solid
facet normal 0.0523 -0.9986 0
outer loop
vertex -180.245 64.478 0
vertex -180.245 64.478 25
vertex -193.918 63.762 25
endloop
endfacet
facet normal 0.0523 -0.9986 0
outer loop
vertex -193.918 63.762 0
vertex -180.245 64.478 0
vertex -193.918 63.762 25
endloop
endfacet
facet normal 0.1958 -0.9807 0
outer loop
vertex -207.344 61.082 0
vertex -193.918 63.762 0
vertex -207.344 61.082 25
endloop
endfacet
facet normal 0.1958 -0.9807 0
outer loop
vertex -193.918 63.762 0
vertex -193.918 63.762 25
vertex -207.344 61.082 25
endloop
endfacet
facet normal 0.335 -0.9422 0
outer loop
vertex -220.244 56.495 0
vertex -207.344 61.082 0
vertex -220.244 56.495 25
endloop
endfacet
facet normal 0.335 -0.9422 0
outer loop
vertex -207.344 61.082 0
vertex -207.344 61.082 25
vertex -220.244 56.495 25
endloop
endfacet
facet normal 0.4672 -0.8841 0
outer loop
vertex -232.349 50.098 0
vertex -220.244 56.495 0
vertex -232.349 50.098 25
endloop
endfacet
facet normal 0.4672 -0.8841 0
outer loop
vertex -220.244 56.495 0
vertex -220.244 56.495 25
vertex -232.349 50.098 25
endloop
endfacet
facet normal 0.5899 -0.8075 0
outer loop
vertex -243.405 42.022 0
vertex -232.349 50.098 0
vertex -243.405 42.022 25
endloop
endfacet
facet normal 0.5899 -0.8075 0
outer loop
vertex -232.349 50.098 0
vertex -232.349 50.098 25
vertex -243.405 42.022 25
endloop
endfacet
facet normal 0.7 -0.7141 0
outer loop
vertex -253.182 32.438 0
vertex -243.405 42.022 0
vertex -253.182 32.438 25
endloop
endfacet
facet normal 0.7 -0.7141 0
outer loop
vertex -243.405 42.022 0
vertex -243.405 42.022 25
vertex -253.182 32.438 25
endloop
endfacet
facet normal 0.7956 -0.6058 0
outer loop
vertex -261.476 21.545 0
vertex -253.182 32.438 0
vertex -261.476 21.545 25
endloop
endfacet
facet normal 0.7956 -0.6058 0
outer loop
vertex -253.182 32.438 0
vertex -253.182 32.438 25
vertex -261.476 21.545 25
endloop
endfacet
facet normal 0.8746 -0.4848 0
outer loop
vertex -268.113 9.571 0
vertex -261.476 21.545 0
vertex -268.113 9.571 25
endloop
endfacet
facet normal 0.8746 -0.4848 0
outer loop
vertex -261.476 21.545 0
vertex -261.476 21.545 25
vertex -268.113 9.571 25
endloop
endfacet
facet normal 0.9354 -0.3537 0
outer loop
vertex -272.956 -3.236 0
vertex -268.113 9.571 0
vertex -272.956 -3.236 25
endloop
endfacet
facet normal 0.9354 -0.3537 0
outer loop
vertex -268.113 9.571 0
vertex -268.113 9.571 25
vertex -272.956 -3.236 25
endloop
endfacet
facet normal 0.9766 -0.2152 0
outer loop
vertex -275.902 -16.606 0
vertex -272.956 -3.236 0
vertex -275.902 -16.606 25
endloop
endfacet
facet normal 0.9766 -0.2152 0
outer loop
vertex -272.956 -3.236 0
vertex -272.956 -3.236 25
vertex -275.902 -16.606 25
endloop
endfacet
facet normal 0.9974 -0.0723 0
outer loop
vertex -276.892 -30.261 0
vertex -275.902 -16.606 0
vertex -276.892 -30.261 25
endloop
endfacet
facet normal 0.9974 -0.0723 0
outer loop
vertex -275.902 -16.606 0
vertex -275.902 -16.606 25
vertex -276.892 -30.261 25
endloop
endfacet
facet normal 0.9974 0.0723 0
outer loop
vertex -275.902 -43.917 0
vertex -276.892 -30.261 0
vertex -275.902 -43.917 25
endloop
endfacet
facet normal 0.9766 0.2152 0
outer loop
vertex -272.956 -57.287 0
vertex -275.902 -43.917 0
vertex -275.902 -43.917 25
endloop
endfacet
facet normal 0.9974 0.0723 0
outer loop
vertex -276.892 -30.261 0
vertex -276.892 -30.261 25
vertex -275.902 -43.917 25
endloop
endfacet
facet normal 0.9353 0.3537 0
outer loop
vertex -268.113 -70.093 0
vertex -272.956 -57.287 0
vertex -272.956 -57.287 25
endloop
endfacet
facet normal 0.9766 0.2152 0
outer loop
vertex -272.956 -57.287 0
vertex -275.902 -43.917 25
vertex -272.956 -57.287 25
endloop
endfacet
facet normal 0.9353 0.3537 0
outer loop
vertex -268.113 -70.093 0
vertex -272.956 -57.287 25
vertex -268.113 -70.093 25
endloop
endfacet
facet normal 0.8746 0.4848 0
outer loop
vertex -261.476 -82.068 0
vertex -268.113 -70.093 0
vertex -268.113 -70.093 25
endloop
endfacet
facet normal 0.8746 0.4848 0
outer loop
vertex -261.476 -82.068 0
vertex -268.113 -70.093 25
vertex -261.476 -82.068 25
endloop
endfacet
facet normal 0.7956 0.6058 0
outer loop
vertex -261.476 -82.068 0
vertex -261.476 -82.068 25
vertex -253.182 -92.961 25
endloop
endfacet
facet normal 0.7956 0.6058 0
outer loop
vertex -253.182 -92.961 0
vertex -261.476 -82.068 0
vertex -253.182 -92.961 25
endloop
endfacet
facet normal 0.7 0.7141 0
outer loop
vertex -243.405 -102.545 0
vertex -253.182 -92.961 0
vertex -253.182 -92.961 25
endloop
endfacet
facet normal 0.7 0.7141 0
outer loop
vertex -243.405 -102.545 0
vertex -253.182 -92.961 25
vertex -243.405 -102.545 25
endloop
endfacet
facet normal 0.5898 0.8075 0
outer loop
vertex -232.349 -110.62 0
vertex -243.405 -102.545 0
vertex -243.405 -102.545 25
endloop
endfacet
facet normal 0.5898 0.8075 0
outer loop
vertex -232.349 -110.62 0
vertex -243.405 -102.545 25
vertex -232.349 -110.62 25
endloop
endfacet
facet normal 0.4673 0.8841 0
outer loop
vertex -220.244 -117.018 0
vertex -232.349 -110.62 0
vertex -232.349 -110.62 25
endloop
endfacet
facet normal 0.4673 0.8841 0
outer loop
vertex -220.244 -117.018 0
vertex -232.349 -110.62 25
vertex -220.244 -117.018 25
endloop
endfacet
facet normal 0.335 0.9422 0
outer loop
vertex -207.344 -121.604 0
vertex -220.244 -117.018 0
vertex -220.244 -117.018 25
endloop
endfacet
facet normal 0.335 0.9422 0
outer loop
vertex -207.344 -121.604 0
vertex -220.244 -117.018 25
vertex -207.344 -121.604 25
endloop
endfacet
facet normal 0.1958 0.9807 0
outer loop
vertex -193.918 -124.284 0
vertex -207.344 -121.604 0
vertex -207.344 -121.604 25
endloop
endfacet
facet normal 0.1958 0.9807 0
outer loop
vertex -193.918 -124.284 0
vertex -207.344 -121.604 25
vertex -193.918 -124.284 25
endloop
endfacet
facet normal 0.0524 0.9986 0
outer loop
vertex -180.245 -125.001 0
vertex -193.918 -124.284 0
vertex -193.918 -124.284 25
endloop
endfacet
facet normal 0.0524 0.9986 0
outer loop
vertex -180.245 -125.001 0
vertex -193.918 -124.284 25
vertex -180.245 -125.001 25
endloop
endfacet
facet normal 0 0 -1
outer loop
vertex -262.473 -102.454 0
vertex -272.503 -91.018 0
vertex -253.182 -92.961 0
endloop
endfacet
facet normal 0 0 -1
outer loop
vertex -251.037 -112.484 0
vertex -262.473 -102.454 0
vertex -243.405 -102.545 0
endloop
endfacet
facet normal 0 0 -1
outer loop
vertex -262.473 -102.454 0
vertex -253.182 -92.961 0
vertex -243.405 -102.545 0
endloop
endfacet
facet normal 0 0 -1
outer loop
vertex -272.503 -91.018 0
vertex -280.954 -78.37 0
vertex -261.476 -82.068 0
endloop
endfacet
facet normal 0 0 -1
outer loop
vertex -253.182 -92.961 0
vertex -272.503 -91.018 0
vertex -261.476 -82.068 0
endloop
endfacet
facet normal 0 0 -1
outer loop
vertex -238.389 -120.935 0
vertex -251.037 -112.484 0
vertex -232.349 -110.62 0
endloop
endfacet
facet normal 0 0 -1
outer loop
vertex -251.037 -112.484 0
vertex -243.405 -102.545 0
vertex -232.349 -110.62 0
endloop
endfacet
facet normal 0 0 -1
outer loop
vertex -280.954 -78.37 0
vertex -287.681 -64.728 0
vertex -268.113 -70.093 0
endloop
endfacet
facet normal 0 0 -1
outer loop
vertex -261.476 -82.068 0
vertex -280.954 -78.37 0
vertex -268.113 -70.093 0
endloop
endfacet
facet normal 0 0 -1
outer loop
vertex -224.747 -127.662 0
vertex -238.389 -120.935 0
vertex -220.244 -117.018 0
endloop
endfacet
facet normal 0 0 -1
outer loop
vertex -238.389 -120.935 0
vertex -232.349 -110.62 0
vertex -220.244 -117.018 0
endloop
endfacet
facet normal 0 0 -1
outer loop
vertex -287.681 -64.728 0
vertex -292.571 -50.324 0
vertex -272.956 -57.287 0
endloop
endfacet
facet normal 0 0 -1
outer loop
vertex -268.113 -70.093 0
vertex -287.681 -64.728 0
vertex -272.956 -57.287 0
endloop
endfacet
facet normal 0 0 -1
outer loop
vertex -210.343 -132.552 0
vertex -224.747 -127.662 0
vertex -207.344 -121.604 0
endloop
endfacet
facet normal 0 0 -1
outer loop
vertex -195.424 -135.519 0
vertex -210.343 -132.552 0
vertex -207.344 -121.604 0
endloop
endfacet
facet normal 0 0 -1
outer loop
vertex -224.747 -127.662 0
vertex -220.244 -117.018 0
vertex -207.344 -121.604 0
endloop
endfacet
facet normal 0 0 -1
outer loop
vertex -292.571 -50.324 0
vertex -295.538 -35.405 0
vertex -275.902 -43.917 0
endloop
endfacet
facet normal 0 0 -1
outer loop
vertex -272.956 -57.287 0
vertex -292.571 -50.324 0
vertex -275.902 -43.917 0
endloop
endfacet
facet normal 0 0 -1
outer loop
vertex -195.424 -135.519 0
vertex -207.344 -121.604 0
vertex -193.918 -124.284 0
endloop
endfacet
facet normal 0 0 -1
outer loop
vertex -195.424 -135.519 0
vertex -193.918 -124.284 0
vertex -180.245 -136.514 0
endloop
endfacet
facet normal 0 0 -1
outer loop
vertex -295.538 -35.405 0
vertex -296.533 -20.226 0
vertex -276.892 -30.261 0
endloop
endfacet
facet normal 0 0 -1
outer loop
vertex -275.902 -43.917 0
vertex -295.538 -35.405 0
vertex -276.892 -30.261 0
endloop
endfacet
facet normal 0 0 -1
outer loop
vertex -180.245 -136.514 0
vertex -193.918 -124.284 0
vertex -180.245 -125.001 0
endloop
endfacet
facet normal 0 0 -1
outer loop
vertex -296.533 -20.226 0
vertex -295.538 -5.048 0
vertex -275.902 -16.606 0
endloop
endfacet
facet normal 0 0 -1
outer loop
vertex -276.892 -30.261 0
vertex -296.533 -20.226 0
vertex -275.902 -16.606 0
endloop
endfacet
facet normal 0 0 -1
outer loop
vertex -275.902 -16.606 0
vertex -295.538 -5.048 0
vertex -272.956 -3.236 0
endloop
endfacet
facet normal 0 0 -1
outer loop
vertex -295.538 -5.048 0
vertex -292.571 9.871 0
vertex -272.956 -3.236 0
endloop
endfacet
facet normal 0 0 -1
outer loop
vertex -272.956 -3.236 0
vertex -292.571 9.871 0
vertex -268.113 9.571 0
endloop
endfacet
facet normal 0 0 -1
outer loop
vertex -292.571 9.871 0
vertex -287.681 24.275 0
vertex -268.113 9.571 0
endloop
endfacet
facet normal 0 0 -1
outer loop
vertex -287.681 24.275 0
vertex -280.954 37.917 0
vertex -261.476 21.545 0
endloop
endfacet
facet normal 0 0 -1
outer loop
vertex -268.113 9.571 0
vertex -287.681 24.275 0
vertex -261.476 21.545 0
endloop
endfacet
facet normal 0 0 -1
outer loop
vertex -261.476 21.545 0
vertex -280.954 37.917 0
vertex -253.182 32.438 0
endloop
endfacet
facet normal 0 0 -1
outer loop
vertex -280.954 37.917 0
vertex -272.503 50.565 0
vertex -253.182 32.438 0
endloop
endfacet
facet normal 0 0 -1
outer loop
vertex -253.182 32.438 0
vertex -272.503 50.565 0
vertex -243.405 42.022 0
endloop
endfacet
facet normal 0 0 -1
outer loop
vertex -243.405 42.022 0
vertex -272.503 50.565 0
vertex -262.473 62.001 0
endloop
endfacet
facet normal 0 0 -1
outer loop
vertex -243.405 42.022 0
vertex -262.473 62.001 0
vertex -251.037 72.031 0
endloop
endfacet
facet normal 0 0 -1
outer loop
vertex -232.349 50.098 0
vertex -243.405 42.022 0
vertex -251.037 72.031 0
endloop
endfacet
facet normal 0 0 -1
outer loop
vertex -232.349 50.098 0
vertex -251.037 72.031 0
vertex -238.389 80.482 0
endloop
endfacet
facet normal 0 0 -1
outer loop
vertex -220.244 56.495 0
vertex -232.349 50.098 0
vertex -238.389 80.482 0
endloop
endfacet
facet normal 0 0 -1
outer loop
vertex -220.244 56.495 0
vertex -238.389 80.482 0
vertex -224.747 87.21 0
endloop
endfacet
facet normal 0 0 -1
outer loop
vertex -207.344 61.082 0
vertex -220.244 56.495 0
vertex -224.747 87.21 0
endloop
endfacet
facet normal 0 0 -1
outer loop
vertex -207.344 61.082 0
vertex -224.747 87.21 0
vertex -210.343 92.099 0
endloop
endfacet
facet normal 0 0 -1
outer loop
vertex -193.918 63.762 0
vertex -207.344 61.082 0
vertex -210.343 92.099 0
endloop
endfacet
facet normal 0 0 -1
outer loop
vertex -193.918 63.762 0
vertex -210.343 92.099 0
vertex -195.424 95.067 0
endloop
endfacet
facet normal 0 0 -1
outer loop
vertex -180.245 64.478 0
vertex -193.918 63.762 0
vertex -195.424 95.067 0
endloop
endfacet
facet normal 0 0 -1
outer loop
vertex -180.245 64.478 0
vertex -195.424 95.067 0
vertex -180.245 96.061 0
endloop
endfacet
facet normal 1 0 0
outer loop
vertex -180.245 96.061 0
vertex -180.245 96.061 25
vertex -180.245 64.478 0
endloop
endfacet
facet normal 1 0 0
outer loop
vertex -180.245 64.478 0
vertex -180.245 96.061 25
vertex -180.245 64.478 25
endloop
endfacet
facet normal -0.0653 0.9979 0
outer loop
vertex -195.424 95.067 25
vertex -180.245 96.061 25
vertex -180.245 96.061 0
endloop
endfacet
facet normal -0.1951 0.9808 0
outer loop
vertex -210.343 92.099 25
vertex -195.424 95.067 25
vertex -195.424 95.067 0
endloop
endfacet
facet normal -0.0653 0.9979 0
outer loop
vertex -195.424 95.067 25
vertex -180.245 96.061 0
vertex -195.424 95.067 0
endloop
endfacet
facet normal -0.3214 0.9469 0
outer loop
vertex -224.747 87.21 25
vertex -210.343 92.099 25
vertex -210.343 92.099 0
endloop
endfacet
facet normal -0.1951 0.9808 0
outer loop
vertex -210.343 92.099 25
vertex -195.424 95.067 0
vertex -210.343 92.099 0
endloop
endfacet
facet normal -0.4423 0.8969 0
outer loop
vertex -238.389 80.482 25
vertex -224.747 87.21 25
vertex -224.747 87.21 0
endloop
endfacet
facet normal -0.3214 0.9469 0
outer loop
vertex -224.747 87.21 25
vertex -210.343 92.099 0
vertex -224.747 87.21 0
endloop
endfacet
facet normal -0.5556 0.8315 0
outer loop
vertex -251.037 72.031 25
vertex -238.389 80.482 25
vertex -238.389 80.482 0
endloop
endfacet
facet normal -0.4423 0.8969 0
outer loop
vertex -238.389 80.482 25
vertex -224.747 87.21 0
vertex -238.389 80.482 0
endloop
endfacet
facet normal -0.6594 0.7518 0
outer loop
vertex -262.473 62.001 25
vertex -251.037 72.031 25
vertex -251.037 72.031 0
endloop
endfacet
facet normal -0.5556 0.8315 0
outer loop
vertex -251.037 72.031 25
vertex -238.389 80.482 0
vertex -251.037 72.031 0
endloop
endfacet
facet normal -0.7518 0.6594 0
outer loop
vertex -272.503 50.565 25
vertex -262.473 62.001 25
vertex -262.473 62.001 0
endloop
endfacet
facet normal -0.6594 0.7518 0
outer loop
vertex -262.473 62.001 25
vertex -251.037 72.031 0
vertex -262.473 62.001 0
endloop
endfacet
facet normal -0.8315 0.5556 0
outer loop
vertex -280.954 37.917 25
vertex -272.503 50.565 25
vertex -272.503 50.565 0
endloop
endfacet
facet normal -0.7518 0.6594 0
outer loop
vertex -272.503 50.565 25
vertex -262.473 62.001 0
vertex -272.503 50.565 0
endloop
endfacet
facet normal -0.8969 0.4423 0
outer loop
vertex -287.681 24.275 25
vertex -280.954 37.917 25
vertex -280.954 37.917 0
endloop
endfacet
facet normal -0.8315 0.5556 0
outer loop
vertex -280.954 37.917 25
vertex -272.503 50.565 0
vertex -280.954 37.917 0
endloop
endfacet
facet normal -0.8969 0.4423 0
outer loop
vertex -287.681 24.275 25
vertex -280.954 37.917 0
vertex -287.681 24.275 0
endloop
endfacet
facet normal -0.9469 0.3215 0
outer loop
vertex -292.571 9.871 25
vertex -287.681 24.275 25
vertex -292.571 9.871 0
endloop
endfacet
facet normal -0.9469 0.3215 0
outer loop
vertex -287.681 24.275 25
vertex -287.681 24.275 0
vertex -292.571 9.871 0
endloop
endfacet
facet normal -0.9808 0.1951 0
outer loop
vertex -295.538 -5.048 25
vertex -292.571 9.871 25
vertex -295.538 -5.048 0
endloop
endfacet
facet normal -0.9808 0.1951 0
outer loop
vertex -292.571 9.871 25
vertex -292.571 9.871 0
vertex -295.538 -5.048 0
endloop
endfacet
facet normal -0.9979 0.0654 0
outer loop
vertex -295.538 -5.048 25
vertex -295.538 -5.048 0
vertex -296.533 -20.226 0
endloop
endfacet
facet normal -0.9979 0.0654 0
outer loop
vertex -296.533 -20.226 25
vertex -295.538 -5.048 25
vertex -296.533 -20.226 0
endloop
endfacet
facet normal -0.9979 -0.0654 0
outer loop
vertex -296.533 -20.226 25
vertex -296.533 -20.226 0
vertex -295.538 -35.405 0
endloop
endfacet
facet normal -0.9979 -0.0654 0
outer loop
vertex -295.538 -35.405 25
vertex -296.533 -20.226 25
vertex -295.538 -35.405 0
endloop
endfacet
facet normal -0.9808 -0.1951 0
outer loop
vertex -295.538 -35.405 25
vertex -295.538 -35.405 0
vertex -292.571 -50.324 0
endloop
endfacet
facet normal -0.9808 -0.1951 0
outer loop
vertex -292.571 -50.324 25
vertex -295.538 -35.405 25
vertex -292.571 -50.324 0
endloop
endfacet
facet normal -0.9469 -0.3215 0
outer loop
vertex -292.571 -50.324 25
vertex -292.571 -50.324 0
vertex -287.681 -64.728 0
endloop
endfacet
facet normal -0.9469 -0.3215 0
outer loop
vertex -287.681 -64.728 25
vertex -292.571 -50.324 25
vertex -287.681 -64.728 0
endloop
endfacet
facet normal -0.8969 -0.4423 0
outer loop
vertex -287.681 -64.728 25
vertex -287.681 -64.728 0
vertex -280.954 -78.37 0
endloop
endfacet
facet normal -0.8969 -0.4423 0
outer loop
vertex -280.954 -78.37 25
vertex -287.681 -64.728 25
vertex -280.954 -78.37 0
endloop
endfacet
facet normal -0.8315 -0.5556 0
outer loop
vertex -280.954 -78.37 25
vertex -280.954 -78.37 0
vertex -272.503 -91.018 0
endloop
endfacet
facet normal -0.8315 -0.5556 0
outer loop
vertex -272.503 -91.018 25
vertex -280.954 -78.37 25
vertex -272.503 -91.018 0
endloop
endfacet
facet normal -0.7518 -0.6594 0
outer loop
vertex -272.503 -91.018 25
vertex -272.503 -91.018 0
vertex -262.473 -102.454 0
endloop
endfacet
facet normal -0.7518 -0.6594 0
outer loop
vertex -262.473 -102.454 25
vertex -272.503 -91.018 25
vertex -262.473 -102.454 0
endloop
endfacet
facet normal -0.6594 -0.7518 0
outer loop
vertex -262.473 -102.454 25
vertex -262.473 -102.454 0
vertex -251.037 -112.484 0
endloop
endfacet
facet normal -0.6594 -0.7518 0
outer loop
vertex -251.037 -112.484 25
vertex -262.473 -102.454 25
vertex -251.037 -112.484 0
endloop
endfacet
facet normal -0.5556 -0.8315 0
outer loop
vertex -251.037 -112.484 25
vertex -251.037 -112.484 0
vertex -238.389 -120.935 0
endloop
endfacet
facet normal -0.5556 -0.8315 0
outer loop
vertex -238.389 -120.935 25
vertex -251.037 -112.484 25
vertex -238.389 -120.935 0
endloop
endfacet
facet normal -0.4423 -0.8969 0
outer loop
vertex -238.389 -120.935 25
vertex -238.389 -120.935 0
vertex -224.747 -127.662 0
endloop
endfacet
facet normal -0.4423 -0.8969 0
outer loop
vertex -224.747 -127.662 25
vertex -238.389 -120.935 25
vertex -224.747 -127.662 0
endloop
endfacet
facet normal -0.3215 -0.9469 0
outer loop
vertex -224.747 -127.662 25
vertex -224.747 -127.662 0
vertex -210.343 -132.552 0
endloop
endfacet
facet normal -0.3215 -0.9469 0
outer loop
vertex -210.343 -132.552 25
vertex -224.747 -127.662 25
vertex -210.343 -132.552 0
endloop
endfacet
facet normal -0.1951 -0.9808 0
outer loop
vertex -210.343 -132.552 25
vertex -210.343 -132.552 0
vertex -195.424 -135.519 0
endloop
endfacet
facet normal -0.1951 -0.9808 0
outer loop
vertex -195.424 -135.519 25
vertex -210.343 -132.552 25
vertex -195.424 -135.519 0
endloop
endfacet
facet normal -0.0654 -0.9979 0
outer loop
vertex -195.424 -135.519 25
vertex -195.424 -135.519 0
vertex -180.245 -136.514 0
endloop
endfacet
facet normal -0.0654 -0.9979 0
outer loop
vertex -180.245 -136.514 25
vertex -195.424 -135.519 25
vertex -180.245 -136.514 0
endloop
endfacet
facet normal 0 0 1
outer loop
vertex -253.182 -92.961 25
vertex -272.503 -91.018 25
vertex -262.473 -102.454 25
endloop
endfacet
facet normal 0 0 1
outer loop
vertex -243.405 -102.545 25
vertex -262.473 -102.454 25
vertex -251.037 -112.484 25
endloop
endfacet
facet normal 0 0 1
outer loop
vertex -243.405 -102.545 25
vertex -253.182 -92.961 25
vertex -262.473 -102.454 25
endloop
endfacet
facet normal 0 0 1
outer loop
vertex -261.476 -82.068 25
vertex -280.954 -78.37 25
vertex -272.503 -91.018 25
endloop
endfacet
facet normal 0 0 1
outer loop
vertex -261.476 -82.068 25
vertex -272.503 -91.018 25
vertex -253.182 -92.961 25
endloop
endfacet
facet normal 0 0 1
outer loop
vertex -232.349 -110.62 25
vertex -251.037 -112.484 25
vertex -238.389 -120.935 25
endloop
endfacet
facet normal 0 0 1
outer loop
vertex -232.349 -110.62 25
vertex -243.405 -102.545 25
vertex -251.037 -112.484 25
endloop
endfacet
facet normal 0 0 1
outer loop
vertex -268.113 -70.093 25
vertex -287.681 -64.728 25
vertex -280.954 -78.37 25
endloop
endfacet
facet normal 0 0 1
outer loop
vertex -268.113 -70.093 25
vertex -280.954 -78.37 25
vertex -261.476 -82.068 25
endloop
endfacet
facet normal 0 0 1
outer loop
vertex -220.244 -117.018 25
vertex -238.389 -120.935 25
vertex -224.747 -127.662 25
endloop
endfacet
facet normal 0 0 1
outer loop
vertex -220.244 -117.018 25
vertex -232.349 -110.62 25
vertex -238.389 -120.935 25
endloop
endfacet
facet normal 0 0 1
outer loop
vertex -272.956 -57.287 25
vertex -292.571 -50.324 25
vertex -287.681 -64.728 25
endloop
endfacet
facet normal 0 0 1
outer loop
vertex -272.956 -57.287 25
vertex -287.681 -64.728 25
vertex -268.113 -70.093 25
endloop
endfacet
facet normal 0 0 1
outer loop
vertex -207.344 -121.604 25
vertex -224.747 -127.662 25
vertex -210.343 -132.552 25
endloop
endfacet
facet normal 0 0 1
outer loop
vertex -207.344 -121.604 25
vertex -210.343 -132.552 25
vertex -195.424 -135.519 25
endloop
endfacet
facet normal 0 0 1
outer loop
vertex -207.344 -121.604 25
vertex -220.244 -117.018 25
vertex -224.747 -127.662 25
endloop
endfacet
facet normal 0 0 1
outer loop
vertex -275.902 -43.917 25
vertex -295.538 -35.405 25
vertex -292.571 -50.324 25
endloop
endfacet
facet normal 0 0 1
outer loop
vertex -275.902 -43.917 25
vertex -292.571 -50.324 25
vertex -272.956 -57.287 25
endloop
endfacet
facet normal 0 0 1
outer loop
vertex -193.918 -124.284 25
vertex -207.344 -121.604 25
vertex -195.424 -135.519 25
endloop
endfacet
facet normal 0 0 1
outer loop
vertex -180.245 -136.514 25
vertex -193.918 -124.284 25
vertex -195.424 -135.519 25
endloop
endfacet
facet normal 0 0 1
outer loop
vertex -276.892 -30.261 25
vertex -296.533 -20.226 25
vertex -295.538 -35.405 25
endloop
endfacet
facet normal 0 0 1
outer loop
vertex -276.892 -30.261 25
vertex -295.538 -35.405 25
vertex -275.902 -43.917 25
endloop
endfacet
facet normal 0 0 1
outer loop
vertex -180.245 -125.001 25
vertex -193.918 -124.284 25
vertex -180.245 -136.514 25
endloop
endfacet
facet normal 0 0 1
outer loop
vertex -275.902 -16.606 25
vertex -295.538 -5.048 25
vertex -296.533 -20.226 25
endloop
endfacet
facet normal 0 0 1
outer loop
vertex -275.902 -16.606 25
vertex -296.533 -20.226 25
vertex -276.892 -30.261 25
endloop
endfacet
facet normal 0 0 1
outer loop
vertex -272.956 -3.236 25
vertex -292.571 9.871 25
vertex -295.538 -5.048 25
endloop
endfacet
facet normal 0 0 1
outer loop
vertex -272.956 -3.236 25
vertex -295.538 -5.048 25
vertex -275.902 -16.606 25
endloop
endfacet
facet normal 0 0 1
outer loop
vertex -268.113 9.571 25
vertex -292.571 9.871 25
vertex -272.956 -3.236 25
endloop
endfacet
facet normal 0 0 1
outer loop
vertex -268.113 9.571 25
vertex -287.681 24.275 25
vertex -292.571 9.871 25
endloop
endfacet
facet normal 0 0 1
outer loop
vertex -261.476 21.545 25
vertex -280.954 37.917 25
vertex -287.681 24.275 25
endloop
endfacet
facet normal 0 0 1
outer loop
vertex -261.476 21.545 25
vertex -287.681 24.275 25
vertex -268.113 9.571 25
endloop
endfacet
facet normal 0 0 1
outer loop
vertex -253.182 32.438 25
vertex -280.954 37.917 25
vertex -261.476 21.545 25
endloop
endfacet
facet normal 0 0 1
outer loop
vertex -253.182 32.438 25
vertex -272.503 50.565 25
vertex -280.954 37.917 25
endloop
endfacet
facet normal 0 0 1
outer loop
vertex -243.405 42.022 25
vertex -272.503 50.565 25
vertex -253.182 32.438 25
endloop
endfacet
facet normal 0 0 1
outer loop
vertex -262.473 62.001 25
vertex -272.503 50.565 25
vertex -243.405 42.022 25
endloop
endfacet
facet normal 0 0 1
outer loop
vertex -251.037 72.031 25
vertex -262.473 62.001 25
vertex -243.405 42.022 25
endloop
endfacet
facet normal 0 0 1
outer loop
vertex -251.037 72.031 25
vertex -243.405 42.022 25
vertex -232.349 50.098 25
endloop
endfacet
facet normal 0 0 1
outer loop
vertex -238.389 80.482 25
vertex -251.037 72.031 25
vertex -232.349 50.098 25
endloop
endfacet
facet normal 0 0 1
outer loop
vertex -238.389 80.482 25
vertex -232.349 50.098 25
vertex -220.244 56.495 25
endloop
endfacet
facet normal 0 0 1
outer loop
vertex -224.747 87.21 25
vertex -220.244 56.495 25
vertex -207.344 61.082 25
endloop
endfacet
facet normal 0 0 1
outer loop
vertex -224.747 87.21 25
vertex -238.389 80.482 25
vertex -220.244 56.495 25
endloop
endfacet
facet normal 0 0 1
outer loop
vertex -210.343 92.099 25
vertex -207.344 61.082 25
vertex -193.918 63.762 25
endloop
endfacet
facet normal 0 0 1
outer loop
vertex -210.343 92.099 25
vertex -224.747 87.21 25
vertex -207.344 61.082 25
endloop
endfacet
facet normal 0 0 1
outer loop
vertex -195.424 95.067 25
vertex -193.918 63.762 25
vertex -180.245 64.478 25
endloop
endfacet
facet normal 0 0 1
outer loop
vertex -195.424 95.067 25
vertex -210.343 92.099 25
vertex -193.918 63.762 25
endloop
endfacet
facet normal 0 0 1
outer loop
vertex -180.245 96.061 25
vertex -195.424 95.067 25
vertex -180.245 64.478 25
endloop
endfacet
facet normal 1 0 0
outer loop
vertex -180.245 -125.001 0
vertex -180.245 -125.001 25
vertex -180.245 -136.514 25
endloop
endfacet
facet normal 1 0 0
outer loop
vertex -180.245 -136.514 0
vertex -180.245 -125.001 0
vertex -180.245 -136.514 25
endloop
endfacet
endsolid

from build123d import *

# Parameters (mm, degrees)
F0_R     = 116.287792
F1_DEPTH = 25
F2_R     = 94.758514
F3_DEPTH = 25.001
F5_DEPTH = 25.001


with BuildPart() as f1:
    # F0 (on Top) → F1 (new body)
    with BuildSketch(Plane.XY):
        with Locations((-180.245414, -20.226402)):
            Circle(F0_R)
    extrude(amount=F1_DEPTH)

    # F2 (on face) → F3 (cut, through all)
    with BuildSketch(Plane.XY.offset(25)):
        with Locations((-182.132989, -30.261295)):
            Circle(F2_R)
    extrude(amount=-F3_DEPTH, mode=Mode.SUBTRACT)

    # F4 (on face) → F5 (cut, through all)
    with BuildSketch(Plane.XY.offset(25)):
        Polygon((-180.245414, 124.963261), (-180.245414, -20.226402), (-180.245414, -167.464018), (-41.918594, -167.464018), (-41.918594, 124.963261), align=None)
    extrude(amount=-F5_DEPTH, mode=Mode.SUBTRACT)


solid = f1.part
